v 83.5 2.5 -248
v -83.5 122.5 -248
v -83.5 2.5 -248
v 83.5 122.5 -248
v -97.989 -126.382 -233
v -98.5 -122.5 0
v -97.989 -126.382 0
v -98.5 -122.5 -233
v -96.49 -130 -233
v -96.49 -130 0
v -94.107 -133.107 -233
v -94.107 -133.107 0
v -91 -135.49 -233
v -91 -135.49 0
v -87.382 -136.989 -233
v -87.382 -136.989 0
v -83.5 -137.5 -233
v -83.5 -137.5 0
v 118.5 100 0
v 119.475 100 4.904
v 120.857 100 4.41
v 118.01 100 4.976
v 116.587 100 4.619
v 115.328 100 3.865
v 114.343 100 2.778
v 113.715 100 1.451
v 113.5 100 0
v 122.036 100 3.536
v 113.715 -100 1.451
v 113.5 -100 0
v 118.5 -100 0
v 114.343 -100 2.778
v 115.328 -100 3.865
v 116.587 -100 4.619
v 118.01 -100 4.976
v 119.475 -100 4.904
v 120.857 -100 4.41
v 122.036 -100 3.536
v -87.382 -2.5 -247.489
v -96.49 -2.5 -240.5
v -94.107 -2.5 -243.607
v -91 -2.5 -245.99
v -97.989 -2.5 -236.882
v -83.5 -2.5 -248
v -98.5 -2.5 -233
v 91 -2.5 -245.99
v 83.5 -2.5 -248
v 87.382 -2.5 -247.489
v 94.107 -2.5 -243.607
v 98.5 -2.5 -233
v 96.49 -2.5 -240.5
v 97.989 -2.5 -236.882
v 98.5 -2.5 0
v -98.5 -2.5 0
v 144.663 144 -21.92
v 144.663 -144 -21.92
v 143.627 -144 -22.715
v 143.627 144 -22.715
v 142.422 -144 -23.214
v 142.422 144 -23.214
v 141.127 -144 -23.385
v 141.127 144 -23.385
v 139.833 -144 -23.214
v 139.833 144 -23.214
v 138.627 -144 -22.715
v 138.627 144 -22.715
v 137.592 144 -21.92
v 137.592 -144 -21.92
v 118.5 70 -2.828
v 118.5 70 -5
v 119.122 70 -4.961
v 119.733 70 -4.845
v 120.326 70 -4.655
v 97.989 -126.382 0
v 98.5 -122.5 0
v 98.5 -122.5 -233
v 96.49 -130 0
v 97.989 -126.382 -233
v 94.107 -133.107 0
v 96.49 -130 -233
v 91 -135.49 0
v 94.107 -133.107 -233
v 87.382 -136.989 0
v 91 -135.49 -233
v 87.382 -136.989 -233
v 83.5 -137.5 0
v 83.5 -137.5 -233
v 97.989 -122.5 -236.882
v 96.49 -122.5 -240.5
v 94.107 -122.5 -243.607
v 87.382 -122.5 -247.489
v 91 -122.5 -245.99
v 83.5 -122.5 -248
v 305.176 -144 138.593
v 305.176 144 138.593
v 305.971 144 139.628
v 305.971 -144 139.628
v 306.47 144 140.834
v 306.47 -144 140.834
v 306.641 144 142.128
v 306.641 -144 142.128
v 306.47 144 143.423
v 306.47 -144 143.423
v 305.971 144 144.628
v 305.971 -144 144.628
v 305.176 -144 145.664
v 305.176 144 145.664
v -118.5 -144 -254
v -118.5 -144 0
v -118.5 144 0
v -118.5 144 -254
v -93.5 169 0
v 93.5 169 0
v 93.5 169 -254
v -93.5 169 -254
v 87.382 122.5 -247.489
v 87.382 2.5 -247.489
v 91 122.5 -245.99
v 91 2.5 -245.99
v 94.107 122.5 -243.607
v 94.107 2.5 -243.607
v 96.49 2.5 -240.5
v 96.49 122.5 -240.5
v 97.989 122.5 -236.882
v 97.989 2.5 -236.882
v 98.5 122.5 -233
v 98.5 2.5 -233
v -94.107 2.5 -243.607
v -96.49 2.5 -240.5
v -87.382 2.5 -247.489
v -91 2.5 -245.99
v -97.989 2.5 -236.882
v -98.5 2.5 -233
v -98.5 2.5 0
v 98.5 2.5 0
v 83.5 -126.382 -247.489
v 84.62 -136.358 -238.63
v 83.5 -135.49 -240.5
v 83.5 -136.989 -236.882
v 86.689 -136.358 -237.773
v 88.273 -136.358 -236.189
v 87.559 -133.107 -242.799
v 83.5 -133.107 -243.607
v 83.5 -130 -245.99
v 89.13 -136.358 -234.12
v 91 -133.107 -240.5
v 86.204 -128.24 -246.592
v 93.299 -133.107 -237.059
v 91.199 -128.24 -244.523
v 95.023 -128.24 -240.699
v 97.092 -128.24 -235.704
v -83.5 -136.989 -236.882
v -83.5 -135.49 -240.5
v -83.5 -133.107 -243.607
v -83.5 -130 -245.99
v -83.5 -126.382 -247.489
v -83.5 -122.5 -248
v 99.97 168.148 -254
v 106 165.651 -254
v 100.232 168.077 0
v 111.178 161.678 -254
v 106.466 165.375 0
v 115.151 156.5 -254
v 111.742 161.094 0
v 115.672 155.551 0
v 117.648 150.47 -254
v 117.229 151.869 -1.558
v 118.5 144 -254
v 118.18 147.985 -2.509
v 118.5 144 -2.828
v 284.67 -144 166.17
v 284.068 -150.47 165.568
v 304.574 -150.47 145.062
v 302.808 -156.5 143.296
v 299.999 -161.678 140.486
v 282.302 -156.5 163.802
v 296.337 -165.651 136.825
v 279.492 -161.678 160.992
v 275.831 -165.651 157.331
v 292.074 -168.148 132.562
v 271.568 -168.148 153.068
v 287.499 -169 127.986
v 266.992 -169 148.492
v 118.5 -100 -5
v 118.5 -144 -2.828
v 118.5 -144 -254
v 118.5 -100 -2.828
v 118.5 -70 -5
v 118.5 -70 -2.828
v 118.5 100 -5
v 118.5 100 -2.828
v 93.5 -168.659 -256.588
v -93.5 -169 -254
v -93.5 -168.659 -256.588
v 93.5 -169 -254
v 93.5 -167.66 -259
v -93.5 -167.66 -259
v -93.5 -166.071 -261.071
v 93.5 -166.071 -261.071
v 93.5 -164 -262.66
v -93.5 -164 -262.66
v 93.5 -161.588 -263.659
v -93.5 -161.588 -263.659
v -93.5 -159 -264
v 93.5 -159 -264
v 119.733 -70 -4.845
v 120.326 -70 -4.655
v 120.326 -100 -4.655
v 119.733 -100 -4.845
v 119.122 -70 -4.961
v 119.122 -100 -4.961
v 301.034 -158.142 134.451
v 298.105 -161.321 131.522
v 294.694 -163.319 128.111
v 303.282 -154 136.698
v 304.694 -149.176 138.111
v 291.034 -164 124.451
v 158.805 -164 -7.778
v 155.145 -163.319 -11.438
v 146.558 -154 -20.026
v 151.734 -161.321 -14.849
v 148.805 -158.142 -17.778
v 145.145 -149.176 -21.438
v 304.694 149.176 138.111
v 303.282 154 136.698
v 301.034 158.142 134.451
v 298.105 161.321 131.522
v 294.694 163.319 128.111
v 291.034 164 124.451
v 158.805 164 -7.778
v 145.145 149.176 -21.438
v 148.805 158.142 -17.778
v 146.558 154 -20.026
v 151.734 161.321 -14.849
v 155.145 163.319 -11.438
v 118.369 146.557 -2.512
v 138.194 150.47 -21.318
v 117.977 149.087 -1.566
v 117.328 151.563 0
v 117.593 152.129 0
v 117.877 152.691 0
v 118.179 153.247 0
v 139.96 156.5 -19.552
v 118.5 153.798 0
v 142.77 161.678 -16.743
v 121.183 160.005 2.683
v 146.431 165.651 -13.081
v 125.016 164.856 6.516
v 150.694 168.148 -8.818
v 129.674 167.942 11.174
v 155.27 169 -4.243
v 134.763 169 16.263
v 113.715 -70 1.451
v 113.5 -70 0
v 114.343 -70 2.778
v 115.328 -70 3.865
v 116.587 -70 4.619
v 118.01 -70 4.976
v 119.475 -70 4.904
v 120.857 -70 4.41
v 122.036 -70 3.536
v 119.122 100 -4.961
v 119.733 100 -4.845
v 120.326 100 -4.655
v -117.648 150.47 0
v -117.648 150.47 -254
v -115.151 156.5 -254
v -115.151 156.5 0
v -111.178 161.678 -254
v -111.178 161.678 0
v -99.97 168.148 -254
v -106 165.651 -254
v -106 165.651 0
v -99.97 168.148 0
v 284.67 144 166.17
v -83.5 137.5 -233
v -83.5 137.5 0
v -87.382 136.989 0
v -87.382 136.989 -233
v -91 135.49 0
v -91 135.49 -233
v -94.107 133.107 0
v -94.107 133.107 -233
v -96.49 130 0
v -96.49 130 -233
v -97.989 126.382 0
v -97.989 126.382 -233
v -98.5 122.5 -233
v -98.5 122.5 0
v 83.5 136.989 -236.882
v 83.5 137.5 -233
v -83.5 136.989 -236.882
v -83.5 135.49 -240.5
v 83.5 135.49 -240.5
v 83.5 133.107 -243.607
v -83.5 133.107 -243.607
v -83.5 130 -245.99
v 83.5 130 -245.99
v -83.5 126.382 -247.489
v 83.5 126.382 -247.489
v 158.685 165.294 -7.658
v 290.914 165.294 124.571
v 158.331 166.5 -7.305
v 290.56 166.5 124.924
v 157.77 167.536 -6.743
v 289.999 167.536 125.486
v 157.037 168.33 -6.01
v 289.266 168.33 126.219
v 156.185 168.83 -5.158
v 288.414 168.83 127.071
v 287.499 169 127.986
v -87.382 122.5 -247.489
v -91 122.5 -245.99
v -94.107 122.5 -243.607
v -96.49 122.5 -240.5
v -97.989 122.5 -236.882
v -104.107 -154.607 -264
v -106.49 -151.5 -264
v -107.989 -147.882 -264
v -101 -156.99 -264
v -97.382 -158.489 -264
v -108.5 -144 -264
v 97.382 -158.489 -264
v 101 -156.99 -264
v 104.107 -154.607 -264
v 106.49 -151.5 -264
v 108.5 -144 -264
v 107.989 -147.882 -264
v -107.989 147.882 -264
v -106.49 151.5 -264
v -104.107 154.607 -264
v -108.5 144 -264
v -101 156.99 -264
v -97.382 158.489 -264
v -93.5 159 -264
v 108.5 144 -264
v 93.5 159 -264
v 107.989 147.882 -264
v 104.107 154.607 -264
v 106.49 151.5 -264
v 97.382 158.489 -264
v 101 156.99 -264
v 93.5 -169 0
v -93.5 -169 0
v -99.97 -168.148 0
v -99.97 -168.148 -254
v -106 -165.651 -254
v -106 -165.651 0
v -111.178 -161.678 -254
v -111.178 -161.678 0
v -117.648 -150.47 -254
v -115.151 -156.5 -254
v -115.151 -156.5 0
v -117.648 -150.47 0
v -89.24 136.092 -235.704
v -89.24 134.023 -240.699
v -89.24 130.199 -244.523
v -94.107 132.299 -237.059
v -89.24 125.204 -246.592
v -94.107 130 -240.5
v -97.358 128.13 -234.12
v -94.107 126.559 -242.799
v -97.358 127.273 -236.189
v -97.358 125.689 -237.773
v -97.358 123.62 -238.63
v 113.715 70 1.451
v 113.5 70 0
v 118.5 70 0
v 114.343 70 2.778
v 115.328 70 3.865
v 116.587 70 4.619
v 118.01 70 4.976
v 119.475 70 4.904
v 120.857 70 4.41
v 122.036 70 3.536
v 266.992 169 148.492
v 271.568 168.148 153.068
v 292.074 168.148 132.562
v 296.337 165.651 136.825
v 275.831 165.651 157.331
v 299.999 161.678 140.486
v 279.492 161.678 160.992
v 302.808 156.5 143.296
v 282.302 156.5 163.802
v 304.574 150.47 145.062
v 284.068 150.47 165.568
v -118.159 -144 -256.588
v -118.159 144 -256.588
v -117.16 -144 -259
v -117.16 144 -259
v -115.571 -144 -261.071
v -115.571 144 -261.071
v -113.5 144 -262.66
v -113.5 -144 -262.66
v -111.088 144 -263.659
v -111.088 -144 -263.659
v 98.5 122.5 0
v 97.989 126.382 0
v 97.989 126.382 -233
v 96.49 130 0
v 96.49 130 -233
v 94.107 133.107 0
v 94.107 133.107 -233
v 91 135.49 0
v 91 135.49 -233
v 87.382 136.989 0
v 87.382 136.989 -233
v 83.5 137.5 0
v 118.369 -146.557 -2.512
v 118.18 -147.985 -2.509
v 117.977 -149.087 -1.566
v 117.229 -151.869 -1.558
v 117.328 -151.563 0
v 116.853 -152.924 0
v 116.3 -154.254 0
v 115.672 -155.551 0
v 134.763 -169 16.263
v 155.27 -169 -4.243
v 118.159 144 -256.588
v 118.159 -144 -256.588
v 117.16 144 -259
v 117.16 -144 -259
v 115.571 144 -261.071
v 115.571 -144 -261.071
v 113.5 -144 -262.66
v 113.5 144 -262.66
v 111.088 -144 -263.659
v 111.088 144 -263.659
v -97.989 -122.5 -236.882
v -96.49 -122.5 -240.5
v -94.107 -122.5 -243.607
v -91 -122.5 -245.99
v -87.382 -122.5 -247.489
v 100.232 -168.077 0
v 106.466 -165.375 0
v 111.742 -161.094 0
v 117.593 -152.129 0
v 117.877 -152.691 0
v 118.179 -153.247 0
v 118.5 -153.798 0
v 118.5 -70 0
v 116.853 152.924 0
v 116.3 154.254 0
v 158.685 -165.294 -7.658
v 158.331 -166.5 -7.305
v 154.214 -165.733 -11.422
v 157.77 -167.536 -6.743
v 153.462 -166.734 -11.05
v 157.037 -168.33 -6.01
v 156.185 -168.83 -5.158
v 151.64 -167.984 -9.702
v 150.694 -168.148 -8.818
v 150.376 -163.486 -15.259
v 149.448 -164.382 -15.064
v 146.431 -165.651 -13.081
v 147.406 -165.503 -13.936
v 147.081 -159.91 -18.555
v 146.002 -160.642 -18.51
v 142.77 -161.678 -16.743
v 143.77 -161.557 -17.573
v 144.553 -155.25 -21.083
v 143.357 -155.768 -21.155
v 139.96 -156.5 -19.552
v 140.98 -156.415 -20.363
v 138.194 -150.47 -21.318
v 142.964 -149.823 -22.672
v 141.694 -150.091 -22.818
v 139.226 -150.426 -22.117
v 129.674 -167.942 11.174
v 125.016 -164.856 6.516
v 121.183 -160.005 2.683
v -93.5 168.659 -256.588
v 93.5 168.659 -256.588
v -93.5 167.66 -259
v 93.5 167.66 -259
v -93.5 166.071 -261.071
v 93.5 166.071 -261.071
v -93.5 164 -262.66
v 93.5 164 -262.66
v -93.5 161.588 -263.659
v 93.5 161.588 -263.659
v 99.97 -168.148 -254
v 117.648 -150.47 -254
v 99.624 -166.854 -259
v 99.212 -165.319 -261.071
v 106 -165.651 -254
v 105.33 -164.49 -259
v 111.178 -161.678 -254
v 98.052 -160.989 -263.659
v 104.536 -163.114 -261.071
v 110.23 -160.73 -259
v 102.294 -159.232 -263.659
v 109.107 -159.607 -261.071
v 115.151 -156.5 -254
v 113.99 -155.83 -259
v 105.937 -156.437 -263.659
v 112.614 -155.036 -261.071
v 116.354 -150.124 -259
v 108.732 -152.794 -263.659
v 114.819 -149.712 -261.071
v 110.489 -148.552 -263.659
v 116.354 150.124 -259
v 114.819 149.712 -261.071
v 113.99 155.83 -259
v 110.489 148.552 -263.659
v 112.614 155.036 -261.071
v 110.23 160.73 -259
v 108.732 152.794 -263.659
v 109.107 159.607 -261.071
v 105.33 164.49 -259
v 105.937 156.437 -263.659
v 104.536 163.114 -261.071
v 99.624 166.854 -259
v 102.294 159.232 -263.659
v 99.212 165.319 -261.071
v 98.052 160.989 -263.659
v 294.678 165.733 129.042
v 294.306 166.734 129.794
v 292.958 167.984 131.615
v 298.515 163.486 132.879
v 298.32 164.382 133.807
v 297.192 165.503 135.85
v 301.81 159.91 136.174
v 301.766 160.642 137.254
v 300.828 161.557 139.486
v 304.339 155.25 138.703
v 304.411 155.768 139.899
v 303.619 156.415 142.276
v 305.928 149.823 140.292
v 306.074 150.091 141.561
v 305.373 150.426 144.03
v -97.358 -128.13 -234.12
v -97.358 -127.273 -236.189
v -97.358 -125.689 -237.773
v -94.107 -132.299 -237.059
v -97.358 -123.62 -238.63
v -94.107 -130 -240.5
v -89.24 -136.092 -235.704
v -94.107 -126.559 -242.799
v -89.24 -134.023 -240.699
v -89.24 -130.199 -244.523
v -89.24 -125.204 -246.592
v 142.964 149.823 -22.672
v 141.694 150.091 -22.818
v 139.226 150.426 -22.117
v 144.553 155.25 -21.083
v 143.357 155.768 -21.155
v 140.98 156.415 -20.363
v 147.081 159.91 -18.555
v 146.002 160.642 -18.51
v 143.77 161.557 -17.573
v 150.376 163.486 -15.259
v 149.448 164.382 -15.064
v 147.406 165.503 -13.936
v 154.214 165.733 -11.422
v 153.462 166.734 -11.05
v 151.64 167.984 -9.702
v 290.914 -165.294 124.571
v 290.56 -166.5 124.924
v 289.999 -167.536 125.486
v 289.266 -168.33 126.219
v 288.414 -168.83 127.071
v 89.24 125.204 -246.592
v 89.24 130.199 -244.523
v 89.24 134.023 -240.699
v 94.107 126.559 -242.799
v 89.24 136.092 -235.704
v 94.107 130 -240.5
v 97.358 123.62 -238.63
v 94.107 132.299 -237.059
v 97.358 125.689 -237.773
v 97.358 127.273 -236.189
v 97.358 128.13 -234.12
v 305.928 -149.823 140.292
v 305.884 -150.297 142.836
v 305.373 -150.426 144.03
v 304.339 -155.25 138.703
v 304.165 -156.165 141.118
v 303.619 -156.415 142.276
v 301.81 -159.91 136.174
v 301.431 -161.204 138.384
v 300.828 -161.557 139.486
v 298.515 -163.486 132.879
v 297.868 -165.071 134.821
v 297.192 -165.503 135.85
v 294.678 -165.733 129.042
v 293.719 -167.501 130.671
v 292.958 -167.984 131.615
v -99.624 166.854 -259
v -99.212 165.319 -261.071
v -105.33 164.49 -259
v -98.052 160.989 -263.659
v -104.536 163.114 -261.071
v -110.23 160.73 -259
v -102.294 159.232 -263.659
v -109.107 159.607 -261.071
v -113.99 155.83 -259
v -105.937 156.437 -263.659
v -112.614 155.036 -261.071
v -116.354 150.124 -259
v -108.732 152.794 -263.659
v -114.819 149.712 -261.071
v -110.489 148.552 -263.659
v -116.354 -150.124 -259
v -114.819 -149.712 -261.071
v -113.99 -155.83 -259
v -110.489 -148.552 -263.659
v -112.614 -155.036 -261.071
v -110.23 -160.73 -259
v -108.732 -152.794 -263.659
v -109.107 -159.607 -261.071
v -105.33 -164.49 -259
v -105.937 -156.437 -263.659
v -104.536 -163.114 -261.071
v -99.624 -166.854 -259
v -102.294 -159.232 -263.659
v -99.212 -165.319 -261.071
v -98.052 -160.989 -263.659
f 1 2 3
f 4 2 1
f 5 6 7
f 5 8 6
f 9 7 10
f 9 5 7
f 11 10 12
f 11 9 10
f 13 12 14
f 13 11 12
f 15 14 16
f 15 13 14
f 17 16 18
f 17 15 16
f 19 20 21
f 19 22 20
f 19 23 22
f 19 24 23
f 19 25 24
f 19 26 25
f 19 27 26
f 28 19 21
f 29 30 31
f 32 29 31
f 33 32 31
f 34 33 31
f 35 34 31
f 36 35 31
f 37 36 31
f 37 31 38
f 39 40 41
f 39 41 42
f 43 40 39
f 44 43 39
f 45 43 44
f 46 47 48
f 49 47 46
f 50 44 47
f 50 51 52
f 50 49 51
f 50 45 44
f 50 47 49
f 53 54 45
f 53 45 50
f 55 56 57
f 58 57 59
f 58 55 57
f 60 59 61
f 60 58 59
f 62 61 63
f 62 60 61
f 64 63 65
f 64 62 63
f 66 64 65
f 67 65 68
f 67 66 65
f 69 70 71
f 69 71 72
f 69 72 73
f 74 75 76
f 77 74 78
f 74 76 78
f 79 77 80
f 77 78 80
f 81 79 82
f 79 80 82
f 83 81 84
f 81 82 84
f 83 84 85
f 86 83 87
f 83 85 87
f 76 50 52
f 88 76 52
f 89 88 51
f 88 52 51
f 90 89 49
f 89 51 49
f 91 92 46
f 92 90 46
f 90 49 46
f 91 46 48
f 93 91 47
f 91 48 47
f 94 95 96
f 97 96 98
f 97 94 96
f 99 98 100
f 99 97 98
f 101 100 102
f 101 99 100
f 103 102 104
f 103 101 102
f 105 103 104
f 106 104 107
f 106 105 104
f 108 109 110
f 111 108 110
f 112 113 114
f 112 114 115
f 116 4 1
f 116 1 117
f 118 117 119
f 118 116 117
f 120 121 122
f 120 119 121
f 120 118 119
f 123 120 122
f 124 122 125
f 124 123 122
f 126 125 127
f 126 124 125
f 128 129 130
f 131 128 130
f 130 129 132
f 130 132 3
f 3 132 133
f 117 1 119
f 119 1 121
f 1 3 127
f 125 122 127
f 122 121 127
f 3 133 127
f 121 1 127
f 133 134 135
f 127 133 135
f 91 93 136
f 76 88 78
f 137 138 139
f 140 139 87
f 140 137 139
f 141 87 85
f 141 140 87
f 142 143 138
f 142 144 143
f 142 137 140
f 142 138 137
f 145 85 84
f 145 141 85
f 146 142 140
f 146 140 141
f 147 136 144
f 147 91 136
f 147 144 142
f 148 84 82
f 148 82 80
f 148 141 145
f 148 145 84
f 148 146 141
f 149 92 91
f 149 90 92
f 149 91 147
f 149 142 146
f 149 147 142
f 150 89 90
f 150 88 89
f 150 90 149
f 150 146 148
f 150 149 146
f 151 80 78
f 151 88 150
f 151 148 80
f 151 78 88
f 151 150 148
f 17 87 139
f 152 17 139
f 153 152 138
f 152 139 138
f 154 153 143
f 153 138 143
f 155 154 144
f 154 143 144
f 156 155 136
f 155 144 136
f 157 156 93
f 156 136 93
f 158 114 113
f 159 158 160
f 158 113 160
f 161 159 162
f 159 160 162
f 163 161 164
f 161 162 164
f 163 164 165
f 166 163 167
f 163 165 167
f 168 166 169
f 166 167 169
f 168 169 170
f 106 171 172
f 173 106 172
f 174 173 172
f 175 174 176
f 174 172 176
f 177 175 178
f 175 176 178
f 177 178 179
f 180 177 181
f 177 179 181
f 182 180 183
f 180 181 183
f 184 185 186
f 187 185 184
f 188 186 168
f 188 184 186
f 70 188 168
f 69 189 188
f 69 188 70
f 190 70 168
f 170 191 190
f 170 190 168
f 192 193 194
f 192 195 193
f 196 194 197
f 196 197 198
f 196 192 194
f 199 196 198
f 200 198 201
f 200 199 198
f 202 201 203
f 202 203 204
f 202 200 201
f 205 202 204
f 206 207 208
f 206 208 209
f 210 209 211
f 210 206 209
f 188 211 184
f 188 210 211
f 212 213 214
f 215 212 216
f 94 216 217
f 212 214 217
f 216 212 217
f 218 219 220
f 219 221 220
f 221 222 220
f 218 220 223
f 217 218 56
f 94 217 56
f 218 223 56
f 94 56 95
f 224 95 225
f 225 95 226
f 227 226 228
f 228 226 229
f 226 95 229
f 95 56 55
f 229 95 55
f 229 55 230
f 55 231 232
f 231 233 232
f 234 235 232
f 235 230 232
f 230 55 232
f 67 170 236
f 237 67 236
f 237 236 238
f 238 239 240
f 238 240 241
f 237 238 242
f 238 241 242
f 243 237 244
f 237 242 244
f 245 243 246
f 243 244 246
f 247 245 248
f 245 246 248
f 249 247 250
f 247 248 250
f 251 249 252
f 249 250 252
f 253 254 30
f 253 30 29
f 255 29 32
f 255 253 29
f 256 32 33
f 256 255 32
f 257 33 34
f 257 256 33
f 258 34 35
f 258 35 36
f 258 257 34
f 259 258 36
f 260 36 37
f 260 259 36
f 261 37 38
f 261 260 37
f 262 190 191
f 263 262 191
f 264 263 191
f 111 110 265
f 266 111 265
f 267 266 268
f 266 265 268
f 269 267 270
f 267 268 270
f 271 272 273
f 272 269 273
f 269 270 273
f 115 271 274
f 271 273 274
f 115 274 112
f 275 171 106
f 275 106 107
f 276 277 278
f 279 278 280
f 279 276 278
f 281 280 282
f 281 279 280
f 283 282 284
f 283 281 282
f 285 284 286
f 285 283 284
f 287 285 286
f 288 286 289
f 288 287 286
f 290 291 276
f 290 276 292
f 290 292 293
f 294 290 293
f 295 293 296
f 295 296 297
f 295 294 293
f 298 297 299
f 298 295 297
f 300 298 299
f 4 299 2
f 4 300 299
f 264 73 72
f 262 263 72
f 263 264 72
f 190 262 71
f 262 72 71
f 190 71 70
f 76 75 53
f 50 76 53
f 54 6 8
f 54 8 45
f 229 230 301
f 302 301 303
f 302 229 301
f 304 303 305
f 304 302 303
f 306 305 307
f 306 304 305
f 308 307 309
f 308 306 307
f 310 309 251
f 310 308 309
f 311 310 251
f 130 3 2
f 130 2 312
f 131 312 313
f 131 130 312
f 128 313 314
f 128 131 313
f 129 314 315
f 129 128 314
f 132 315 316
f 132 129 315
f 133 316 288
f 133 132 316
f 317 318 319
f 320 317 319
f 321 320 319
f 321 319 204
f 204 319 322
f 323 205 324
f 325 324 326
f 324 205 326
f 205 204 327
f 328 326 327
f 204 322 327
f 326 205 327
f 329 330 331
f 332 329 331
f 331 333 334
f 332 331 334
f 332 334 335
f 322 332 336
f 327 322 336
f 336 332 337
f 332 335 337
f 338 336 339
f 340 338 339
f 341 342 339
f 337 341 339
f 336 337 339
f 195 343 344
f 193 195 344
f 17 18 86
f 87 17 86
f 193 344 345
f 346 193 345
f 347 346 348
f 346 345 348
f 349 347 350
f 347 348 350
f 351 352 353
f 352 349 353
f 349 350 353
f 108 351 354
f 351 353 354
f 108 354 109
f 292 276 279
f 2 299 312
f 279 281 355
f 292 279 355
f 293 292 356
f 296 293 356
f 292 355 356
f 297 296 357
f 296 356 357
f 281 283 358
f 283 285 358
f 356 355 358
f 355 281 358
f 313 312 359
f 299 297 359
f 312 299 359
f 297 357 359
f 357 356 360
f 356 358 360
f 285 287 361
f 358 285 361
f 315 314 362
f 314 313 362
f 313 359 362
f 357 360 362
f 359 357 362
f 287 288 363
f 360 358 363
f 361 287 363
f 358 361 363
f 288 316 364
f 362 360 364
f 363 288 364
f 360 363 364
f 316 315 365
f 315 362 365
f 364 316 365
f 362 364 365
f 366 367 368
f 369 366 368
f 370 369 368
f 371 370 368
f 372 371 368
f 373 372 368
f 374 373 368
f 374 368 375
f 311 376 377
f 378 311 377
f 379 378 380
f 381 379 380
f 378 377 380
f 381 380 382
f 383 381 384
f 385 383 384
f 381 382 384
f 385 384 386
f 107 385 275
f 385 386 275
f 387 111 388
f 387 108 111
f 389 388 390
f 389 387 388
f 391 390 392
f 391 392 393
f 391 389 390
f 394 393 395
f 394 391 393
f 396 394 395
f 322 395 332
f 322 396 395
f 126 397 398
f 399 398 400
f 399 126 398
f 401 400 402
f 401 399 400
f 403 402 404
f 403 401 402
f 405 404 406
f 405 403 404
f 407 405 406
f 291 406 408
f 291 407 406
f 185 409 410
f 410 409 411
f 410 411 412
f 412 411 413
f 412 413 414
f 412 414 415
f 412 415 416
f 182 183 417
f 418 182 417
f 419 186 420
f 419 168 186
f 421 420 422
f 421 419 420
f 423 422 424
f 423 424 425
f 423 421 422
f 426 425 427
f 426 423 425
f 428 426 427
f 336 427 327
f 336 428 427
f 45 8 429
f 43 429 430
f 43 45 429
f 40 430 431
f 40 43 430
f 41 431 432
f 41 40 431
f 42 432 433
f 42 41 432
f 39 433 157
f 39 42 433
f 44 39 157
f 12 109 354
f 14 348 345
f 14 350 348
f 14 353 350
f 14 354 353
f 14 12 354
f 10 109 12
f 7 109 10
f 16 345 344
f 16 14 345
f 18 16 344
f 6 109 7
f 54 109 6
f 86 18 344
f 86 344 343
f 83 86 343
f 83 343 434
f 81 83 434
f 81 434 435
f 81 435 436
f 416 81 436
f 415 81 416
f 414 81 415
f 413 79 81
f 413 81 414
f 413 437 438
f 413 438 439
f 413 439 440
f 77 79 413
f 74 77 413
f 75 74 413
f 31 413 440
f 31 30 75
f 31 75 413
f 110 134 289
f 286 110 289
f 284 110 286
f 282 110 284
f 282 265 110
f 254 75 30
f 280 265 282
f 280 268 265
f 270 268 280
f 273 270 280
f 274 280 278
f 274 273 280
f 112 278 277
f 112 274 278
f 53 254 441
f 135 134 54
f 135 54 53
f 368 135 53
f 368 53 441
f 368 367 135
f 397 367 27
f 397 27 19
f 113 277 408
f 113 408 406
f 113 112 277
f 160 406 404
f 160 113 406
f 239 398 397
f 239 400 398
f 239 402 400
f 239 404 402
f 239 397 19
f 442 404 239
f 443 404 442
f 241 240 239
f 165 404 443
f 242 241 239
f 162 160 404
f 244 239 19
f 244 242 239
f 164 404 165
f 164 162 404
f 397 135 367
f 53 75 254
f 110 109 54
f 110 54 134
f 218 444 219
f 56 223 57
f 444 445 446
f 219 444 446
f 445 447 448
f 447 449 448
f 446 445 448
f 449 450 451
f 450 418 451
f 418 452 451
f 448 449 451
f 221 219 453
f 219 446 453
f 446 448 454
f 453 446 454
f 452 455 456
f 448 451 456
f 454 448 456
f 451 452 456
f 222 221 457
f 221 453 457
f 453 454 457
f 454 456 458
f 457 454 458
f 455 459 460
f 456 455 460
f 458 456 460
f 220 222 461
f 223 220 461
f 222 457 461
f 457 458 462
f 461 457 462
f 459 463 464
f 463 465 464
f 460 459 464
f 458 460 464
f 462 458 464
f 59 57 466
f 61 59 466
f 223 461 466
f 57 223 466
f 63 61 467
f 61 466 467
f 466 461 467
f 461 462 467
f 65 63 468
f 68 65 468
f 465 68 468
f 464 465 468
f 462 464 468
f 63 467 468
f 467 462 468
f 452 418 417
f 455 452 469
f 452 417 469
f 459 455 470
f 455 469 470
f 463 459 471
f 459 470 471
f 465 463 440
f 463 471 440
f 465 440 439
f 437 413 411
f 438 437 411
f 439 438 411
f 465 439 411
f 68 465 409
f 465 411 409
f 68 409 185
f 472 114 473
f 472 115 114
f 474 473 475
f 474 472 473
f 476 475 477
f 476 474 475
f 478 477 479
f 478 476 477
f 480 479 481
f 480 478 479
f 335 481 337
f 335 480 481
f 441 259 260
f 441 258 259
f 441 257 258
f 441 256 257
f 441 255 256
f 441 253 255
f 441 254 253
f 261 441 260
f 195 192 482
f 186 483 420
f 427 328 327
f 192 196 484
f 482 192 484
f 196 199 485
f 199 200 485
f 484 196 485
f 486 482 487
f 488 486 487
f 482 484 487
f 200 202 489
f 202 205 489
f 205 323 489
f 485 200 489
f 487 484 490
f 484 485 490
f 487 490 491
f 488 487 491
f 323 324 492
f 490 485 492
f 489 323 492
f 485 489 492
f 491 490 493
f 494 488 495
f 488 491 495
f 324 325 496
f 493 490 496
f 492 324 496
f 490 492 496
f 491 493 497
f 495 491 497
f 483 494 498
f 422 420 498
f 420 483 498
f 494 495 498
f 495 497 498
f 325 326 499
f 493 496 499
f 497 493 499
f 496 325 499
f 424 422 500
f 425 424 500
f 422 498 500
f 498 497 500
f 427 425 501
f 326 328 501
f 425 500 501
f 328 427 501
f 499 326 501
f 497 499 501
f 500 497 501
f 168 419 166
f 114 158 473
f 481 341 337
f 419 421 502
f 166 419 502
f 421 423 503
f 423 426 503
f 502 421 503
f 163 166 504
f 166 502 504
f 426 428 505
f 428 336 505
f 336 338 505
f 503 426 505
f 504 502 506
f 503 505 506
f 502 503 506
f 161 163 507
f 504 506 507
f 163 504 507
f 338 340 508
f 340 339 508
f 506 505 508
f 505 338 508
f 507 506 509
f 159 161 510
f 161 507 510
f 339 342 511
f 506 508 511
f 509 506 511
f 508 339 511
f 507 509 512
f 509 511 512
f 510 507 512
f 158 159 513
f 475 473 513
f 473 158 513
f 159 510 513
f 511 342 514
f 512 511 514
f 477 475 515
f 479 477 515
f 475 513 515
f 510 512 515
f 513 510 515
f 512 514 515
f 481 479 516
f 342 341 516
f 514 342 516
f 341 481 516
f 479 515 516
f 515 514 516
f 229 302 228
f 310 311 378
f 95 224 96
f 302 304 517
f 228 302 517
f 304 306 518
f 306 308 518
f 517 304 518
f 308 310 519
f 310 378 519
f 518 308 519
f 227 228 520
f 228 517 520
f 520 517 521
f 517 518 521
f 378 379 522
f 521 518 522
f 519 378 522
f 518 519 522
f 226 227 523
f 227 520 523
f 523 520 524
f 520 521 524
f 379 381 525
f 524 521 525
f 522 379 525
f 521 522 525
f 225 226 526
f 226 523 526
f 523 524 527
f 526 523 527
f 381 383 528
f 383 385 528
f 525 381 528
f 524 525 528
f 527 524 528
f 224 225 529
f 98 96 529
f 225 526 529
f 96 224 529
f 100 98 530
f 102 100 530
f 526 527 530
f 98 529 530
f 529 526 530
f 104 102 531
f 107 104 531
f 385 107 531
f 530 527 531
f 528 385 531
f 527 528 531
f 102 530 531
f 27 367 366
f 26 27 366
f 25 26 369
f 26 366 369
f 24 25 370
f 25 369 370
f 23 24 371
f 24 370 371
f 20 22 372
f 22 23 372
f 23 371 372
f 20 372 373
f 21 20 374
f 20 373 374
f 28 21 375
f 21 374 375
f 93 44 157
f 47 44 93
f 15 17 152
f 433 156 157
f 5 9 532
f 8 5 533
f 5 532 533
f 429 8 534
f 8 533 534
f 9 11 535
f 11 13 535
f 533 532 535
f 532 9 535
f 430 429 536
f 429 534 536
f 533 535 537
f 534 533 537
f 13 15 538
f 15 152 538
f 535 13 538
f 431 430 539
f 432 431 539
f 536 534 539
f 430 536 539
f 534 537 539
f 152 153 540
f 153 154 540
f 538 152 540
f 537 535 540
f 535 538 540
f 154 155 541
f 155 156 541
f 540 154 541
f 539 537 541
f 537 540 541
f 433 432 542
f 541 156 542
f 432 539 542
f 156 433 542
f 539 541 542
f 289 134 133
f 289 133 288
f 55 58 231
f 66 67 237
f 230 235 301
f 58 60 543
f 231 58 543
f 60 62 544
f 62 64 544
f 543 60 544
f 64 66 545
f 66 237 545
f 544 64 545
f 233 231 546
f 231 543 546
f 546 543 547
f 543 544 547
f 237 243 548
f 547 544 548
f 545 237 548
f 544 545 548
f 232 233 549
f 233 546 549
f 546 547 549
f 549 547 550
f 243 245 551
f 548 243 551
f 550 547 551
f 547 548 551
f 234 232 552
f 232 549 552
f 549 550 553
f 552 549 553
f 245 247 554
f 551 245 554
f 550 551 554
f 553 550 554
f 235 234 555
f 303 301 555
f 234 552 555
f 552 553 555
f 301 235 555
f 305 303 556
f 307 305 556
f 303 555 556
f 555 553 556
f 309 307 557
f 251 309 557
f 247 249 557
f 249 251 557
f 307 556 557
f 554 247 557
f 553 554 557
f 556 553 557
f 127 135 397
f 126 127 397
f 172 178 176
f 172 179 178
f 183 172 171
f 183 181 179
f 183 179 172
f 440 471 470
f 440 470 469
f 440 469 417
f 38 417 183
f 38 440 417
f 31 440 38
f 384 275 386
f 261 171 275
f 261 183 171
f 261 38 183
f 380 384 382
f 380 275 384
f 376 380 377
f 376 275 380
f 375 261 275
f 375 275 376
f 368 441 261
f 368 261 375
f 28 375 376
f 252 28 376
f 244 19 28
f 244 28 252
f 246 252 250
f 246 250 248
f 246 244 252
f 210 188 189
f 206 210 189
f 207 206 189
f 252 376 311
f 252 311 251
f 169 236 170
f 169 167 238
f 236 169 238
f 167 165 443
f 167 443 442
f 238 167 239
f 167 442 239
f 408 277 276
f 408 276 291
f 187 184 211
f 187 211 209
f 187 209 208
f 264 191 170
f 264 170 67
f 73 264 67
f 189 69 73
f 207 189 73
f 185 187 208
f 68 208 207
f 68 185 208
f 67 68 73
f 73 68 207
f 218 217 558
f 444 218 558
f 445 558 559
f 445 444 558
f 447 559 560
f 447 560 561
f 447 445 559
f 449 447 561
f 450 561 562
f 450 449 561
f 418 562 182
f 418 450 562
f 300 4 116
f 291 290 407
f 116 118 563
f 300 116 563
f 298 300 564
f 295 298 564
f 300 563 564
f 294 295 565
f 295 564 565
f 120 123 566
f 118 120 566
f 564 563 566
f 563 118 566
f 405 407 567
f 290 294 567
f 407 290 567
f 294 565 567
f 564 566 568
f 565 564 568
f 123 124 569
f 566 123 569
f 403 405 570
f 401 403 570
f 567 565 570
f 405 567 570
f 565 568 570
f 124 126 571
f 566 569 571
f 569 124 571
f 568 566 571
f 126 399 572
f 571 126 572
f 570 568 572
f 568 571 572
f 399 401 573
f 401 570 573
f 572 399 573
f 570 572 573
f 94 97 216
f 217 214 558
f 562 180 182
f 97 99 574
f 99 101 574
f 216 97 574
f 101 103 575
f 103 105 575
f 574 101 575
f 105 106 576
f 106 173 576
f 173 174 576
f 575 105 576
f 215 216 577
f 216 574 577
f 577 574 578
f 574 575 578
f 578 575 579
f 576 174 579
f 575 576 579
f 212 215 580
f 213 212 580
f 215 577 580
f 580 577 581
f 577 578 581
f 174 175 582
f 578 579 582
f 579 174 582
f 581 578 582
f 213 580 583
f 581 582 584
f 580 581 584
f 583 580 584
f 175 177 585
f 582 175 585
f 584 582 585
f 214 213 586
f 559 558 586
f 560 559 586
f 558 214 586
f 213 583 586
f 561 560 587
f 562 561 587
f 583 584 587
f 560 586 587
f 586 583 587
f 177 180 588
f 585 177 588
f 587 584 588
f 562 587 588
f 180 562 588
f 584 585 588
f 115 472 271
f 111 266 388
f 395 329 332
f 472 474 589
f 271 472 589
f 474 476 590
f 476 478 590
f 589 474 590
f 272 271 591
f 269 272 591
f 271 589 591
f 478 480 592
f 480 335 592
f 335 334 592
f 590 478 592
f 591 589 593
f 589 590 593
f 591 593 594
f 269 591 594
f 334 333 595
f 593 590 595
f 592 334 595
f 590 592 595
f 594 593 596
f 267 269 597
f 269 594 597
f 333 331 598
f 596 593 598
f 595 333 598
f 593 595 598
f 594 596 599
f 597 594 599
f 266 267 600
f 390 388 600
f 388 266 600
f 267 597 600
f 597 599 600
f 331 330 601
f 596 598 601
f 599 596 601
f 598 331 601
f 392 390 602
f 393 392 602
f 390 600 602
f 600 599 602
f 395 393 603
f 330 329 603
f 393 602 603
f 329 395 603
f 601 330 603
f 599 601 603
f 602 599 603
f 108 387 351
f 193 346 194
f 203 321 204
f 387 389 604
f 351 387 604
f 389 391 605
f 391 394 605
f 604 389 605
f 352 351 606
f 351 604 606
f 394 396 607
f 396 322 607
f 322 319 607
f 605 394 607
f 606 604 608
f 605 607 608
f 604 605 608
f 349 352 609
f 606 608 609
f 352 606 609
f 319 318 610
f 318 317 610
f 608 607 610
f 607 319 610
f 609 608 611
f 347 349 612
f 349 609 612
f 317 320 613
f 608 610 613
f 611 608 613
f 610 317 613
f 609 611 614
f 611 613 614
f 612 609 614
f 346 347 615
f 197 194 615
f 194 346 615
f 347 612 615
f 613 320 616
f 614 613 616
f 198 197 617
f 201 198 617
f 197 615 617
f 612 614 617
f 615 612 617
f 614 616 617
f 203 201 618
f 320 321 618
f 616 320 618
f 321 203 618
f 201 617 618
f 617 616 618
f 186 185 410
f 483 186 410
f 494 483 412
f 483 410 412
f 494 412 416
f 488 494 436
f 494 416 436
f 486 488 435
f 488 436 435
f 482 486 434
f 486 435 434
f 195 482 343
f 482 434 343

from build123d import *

# Parameters (mm, degrees)
SKETCH_1_W          = 237
SKETCH_1_H          = 338
EXTRUDE_1_DEPTH     = 264
SKETCH_2_W          = 197
SKETCH_2_H          = 275
CUT_EXTRUDE_1_DEPTH = 248
SKETCH_3_W          = 237
SKETCH_3_H          = 5
EXTRUDE_2_DEPTH     = 255
EXTRUDE_START       = 70
SKETCH_4_R          = 5
EXTRUDE_3_DEPTH     = 30
SKETCH_6_W          = 338
SKETCH_6_H          = 237
EXTRUDE_6_DEPTH     = 34
FILLET_1_R          = 25
FILLET_2_R          = 10
FILLET_3_R          = 5
FILLET_4_R          = 15
FILLET_5_R          = 15


with BuildPart() as part:
    # 草图1 → 凸台-拉伸1 (new body)
    with BuildSketch(Plane.XY):
        Rectangle(SKETCH_1_W, SKETCH_1_H)
    extrude(amount=-EXTRUDE_1_DEPTH)

    # 草图2 → 切除-拉伸1 (cut)
    with BuildSketch(Plane.XY):
        Rectangle(SKETCH_2_W, SKETCH_2_H)
    extrude(amount=-CUT_EXTRUDE_1_DEPTH, mode=Mode.SUBTRACT)

    # 草图3 → 凸台-拉伸2 (add)
    with BuildSketch(Plane.XY):
        Rectangle(SKETCH_3_W, SKETCH_3_H)
    extrude(amount=-EXTRUDE_2_DEPTH)

    # 草图4 → 凸台-拉伸3 (add)
    with BuildSketch(Plane(origin=(0, 0, 0), x_dir=(1, 0, 0), z_dir=(0, 1, 0)).offset(EXTRUDE_START)):
        with Locations((118.5, 0)):
            Circle(SKETCH_4_R)
    extrude_3 = extrude(amount=EXTRUDE_3_DEPTH)

    # 镜向1: 凸台-拉伸3 across plane
    add(extrude_3.mirror(Plane.ZX))

    # 草图6 → 凸台-拉伸6 (add)
    with BuildSketch(Plane(origin=(59.25, 0, -59.25), x_dir=(0, 1, 0), z_dir=(-0.7071067811865438, 0, 0.7071067811865512))):
        with Locations((0, -200.292153571)):
            Rectangle(SKETCH_6_W, SKETCH_6_H)
    extrude(amount=-EXTRUDE_6_DEPTH)

    # 圆角1
    # the kernel refuses this fillet: 25 mm, written as the material it takes off along each edge
    with BuildSketch(Plane(origin=(118.5, -169, 59.671572875), x_dir=(-1, 0, 0), z_dir=(0, 0, -1))) as fillet_1_piece_1_section:
        with BuildLine():
            CenterArc((FILLET_1_R, FILLET_1_R), FILLET_1_R, 180, 90)
            Line((0, FILLET_1_R), (-FILLET_1_R * 0.02, FILLET_1_R))
            Line((-FILLET_1_R * 0.02, FILLET_1_R), (-FILLET_1_R * 0.02, -FILLET_1_R * 0.02))
            Line((-FILLET_1_R * 0.02, -FILLET_1_R * 0.02), (FILLET_1_R, -FILLET_1_R * 0.02))
            Line((FILLET_1_R, -FILLET_1_R * 0.02), (FILLET_1_R, 0))
        make_face()
    fillet_1_piece_1 = extrude(amount=323.671572875, mode=Mode.PRIVATE)
    fillet_1_piece_1 = split(fillet_1_piece_1, bisect_by=Plane(origin=(179.466338067, -163.404434067, -63.794765192), z_dir=(-0.7071067811865512, 0, -0.7071067811865438)), keep=Keep.TOP, mode=Mode.PRIVATE)
    add(fillet_1_piece_1, mode=Mode.SUBTRACT)
    with BuildSketch(Plane(origin=(-118.5, -169, 0), x_dir=(1, 0, 0), z_dir=(0, 0, -1)), Plane(origin=(-118.5, 169, 0), x_dir=(0, -1, 0), z_dir=(0, 0, -1))) as fillet_1_piece_2:
        with BuildLine():
            CenterArc((FILLET_1_R, -FILLET_1_R), FILLET_1_R, 90, 90)
            Line((0, -FILLET_1_R), (-FILLET_1_R * 0.02, -FILLET_1_R))
            Line((-FILLET_1_R * 0.02, -FILLET_1_R), (-FILLET_1_R * 0.02, FILLET_1_R * 0.02))
            Line((-FILLET_1_R * 0.02, FILLET_1_R * 0.02), (FILLET_1_R, FILLET_1_R * 0.02))
            Line((FILLET_1_R, FILLET_1_R * 0.02), (FILLET_1_R, 0))
        make_face()
    extrude(amount=264, mode=Mode.SUBTRACT)
    with BuildSketch(Plane(origin=(118.5, 169, 59.671572875), x_dir=(0, -1, 0), z_dir=(0, 0, -1))) as fillet_1_piece_3_section:
        with BuildLine():
            CenterArc((FILLET_1_R, FILLET_1_R), FILLET_1_R, 180, 90)
            Line((0, FILLET_1_R), (-FILLET_1_R * 0.02, FILLET_1_R))
            Line((-FILLET_1_R * 0.02, FILLET_1_R), (-FILLET_1_R * 0.02, -FILLET_1_R * 0.02))
            Line((-FILLET_1_R * 0.02, -FILLET_1_R * 0.02), (FILLET_1_R, -FILLET_1_R * 0.02))
            Line((FILLET_1_R, -FILLET_1_R * 0.02), (FILLET_1_R, 0))
        make_face()
    fillet_1_piece_3 = extrude(amount=323.671572875, mode=Mode.PRIVATE)
    fillet_1_piece_3 = split(fillet_1_piece_3, bisect_by=Plane(origin=(179.466338067, 163.404434067, -63.794765192), z_dir=(-0.7071067811865512, 0, -0.7071067811865438)), keep=Keep.TOP, mode=Mode.PRIVATE)
    add(fillet_1_piece_3, mode=Mode.SUBTRACT)
    with BuildSketch(Plane(origin=(284.670093579, -169, 166.170093579), x_dir=(-0.7071067811865512, -1.1368683772161603e-15, -0.7071067811865439), z_dir=(0.7071067811865438, 0, -0.7071067811865512))) as fillet_1_piece_4:
        with BuildLine():
            CenterArc((FILLET_1_R, FILLET_1_R), FILLET_1_R, 180, 90)
            Line((0, FILLET_1_R), (-FILLET_1_R * 0.02, FILLET_1_R))
            Line((-FILLET_1_R * 0.02, FILLET_1_R), (-FILLET_1_R * 0.02, -FILLET_1_R * 0.02))
            Line((-FILLET_1_R * 0.02, -FILLET_1_R * 0.02), (FILLET_1_R, -FILLET_1_R * 0.02))
            Line((FILLET_1_R, -FILLET_1_R * 0.02), (FILLET_1_R, 0))
        make_face()
    extrude(amount=34, mode=Mode.SUBTRACT)
    with BuildSketch(Plane(origin=(74.305826176, -169, 41.365746699), x_dir=(0.7071067811865512, 0, 0.7071067811865439), z_dir=(0.7071067811865438, 0, -0.7071067811865512))) as fillet_1_piece_5_section:
        with BuildLine():
            CenterArc((FILLET_1_R, -FILLET_1_R), FILLET_1_R, 90, 90)
            Line((0, -FILLET_1_R), (-FILLET_1_R * 0.02, -FILLET_1_R))
            Line((-FILLET_1_R * 0.02, -FILLET_1_R), (-FILLET_1_R * 0.02, FILLET_1_R * 0.02))
            Line((-FILLET_1_R * 0.02, FILLET_1_R * 0.02), (FILLET_1_R, FILLET_1_R * 0.02))
            Line((FILLET_1_R, FILLET_1_R * 0.02), (FILLET_1_R, 0))
        make_face()
    fillet_1_piece_5 = extrude(amount=94.5, mode=Mode.PRIVATE)
    fillet_1_piece_5 = split(fillet_1_piece_5, bisect_by=Plane(origin=(118.5, -163.795791277, -7.320817928), z_dir=(1, 0, 0)), keep=Keep.TOP, mode=Mode.PRIVATE)
    add(fillet_1_piece_5, mode=Mode.SUBTRACT)
    with BuildSketch(Plane(origin=(74.305826176, 169, 41.365746699), x_dir=(0.7071067811865512, 0, 0.7071067811865438), z_dir=(0.7071067811865438, 0, -0.7071067811865512))) as fillet_1_piece_6_section:
        with BuildLine():
            CenterArc((FILLET_1_R, FILLET_1_R), FILLET_1_R, 180, 90)
            Line((0, FILLET_1_R), (-FILLET_1_R * 0.02, FILLET_1_R))
            Line((-FILLET_1_R * 0.02, FILLET_1_R), (-FILLET_1_R * 0.02, -FILLET_1_R * 0.02))
            Line((-FILLET_1_R * 0.02, -FILLET_1_R * 0.02), (FILLET_1_R, -FILLET_1_R * 0.02))
            Line((FILLET_1_R, -FILLET_1_R * 0.02), (FILLET_1_R, 0))
        make_face()
    fillet_1_piece_6 = extrude(amount=94.5, mode=Mode.PRIVATE)
    fillet_1_piece_6 = split(fillet_1_piece_6, bisect_by=Plane(origin=(118.5, 163.795791277, -7.320817928), z_dir=(1, 0, 0)), keep=Keep.TOP, mode=Mode.PRIVATE)
    add(fillet_1_piece_6, mode=Mode.SUBTRACT)
    with BuildSketch(Plane(origin=(284.670093579, 169, 166.170093579), x_dir=(-0.7071067811865512, -3.4106051316484808e-15, -0.7071067811865439), z_dir=(0.7071067811865438, 0, -0.7071067811865512))) as fillet_1_piece_7:
        with BuildLine():
            CenterArc((FILLET_1_R, -FILLET_1_R), FILLET_1_R, 90, 90)
            Line((0, -FILLET_1_R), (-FILLET_1_R * 0.02, -FILLET_1_R))
            Line((-FILLET_1_R * 0.02, -FILLET_1_R), (-FILLET_1_R * 0.02, FILLET_1_R * 0.02))
            Line((-FILLET_1_R * 0.02, FILLET_1_R * 0.02), (FILLET_1_R, FILLET_1_R * 0.02))
            Line((FILLET_1_R, FILLET_1_R * 0.02), (FILLET_1_R, 0))
        make_face()
    extrude(amount=34, mode=Mode.SUBTRACT)
    with BuildSketch(Plane(origin=(118.5, -169, 59.671572875), x_dir=(-1, 0, 0), z_dir=(0, 0, -1))) as fillet_1_piece_8a_section:
        with BuildLine():
            CenterArc((FILLET_1_R, FILLET_1_R), FILLET_1_R, 180, 90)
            Line((0, FILLET_1_R), (-FILLET_1_R * 0.02, FILLET_1_R))
            Line((-FILLET_1_R * 0.02, FILLET_1_R), (-FILLET_1_R * 0.02, -FILLET_1_R * 0.02))
            Line((-FILLET_1_R * 0.02, -FILLET_1_R * 0.02), (FILLET_1_R, -FILLET_1_R * 0.02))
            Line((FILLET_1_R, -FILLET_1_R * 0.02), (FILLET_1_R, 0))
        make_face()
    fillet_1_piece_8a = extrude(amount=323.671572875, mode=Mode.PRIVATE)
    fillet_1_piece_8a = split(fillet_1_piece_8a, bisect_by=Plane(origin=(99.013375852, -163.038214912, 16.658197024), z_dir=(0.7071067811865512, 0, 0.7071067811865438)), keep=Keep.TOP, mode=Mode.PRIVATE)
    with BuildSketch(Plane(origin=(74.305826176, -169, 41.365746699), x_dir=(0.7071067811865512, 0, 0.7071067811865439), z_dir=(0.7071067811865438, 0, -0.7071067811865512))) as fillet_1_piece_8b_section:
        with BuildLine():
            CenterArc((FILLET_1_R, -FILLET_1_R), FILLET_1_R, 90, 90)
            Line((0, -FILLET_1_R), (-FILLET_1_R * 0.02, -FILLET_1_R))
            Line((-FILLET_1_R * 0.02, -FILLET_1_R), (-FILLET_1_R * 0.02, FILLET_1_R * 0.02))
            Line((-FILLET_1_R * 0.02, FILLET_1_R * 0.02), (FILLET_1_R, FILLET_1_R * 0.02))
            Line((FILLET_1_R, FILLET_1_R * 0.02), (FILLET_1_R, 0))
        make_face()
    fillet_1_piece_8b = extrude(amount=94.5, mode=Mode.PRIVATE)
    fillet_1_piece_8b = split(fillet_1_piece_8b, bisect_by=Plane(origin=(118.5, -163.038214912, 24.729821031), z_dir=(-1, 0, 0)), keep=Keep.TOP, mode=Mode.PRIVATE)
    fillet_1_piece_8 = fillet_1_piece_8a & fillet_1_piece_8b
    add(fillet_1_piece_8, mode=Mode.SUBTRACT)
    with BuildSketch(Plane(origin=(118.5, 169, 59.671572875), x_dir=(0, -1, 0), z_dir=(0, 0, -1))) as fillet_1_piece_9a_section:
        with BuildLine():
            CenterArc((FILLET_1_R, FILLET_1_R), FILLET_1_R, 180, 90)
            Line((0, FILLET_1_R), (-FILLET_1_R * 0.02, FILLET_1_R))
            Line((-FILLET_1_R * 0.02, FILLET_1_R), (-FILLET_1_R * 0.02, -FILLET_1_R * 0.02))
            Line((-FILLET_1_R * 0.02, -FILLET_1_R * 0.02), (FILLET_1_R, -FILLET_1_R * 0.02))
            Line((FILLET_1_R, -FILLET_1_R * 0.02), (FILLET_1_R, 0))
        make_face()
    fillet_1_piece_9a = extrude(amount=323.671572875, mode=Mode.PRIVATE)
    fillet_1_piece_9a = split(fillet_1_piece_9a, bisect_by=Plane(origin=(99.013375852, 163.038214912, 16.658197024), z_dir=(0.7071067811865512, 0, 0.7071067811865438)), keep=Keep.TOP, mode=Mode.PRIVATE)
    with BuildSketch(Plane(origin=(74.305826176, 169, 41.365746699), x_dir=(0.7071067811865512, 0, 0.7071067811865438), z_dir=(0.7071067811865438, 0, -0.7071067811865512))) as fillet_1_piece_9b_section:
        with BuildLine():
            CenterArc((FILLET_1_R, FILLET_1_R), FILLET_1_R, 180, 90)
            Line((0, FILLET_1_R), (-FILLET_1_R * 0.02, FILLET_1_R))
            Line((-FILLET_1_R * 0.02, FILLET_1_R), (-FILLET_1_R * 0.02, -FILLET_1_R * 0.02))
            Line((-FILLET_1_R * 0.02, -FILLET_1_R * 0.02), (FILLET_1_R, -FILLET_1_R * 0.02))
            Line((FILLET_1_R, -FILLET_1_R * 0.02), (FILLET_1_R, 0))
        make_face()
    fillet_1_piece_9b = extrude(amount=94.5, mode=Mode.PRIVATE)
    fillet_1_piece_9b = split(fillet_1_piece_9b, bisect_by=Plane(origin=(118.5, 163.038214912, 24.729821031), z_dir=(-1, 0, 0)), keep=Keep.TOP, mode=Mode.PRIVATE)
    fillet_1_piece_9 = fillet_1_piece_9a & fillet_1_piece_9b
    add(fillet_1_piece_9, mode=Mode.SUBTRACT)

    # 圆角2
    fillet_2_edges = [part.edges().sort_by_distance(p)[0] for p in [
        (0, -169, -264),
        (118.5, 0, -264),
        (-118.5, 0, -264),
        (0, 169, -264),
        (-111.17766953, 161.67766953, -264),
        (111.17766953, 161.67766953, -264),
        (-111.17766953, -161.67766953, -264),
        (111.17766953, -161.67766953, -264),
    ]]
    fillet(fillet_2_edges, radius=FILLET_2_R)

    # 圆角3
    fillet_3_edges = [part.edges().sort_by_distance(p)[0] for p in [
        (224.919570569, -169, 58.336309448),
        (141.127416998, 0, -25.455844123),
        (224.919570569, 169, 58.336309448),
        (308.711724139, 0, 142.128463018),
        (146.305086528, 161.67766953, -20.278174593),
        (303.53405461, 161.67766953, 136.950793489),
        (303.53405461, -161.67766953, 136.950793489),
        (146.305086528, -161.67766953, -20.278174593),
    ]]
    fillet(fillet_3_edges, radius=FILLET_3_R)

    # 圆角4
    fillet_4_edges = [part.edges().sort_by_distance(p)[0] for p in [
        (98.5, -70, -248),
        (98.5, 137.5, -124),
        (0, -137.5, -248),
        (98.5, -137.5, -124),
        (-98.5, -137.5, -124),
        (0, 137.5, -248),
        (-98.5, 137.5, -124),
        (-98.5, -70, -248),
    ]]
    fillet(fillet_4_edges, radius=FILLET_4_R)

    # 圆角5
    # the kernel refuses this fillet: 15 mm, written as the material it adds along each edge
    with BuildSketch(Plane(origin=(-83.5, 122.5, -233), x_dir=(0, 0, -1), z_dir=(-1, 0, 0))) as fillet_5_piece_1_section:
        Polygon((0, 0), (FILLET_5_R * 1.02, 0), (FILLET_5_R * 1.02, -FILLET_5_R * 1.02), (0, -FILLET_5_R * 1.02), align=None)
    fillet_5_piece_1 = extrude(amount=FILLET_5_R * 1.02, mode=Mode.PRIVATE)
    fillet_5_piece_1 = fillet_5_piece_1 - Plane(origin=(-83.5, 122.5, -233), x_dir=(0, -0.7071067811865475, 0.7071067811865475), z_dir=(-1, 0, 0)) * Sphere(FILLET_5_R, mode=Mode.PRIVATE)
    add(fillet_5_piece_1)
    with BuildSketch(Plane(origin=(83.5, 122.5, -233), x_dir=(0, 0, -1), z_dir=(1, 0, 0))) as fillet_5_piece_2_section:
        Polygon((0, 0), (FILLET_5_R * 1.02, 0), (FILLET_5_R * 1.02, FILLET_5_R * 1.02), (0, FILLET_5_R * 1.02), align=None)
    fillet_5_piece_2 = extrude(amount=FILLET_5_R * 1.02, mode=Mode.PRIVATE)
    fillet_5_piece_2 = fillet_5_piece_2 - Plane(origin=(83.5, 122.5, -233), x_dir=(0, -0.7071067811865475, 0.7071067811865475), z_dir=(1, 0, 0)) * Sphere(FILLET_5_R, mode=Mode.PRIVATE)
    add(fillet_5_piece_2)
    with BuildSketch(Plane(origin=(-98.5, -35, -248), x_dir=(0, 0, 1), z_dir=(0, 1, 0)), Plane(origin=(98.5, 122.5, -248), x_dir=(0, 0, 1), z_dir=(0, -1, 0))) as fillet_5_piece_3:
        with BuildLine():
            CenterArc((FILLET_5_R, FILLET_5_R), FILLET_5_R, 180, 90)
            Line((0, FILLET_5_R), (0, 0))
            Line((0, 0), (FILLET_5_R, 0))
        make_face()
    extrude(amount=157.5)


solid = part.part
